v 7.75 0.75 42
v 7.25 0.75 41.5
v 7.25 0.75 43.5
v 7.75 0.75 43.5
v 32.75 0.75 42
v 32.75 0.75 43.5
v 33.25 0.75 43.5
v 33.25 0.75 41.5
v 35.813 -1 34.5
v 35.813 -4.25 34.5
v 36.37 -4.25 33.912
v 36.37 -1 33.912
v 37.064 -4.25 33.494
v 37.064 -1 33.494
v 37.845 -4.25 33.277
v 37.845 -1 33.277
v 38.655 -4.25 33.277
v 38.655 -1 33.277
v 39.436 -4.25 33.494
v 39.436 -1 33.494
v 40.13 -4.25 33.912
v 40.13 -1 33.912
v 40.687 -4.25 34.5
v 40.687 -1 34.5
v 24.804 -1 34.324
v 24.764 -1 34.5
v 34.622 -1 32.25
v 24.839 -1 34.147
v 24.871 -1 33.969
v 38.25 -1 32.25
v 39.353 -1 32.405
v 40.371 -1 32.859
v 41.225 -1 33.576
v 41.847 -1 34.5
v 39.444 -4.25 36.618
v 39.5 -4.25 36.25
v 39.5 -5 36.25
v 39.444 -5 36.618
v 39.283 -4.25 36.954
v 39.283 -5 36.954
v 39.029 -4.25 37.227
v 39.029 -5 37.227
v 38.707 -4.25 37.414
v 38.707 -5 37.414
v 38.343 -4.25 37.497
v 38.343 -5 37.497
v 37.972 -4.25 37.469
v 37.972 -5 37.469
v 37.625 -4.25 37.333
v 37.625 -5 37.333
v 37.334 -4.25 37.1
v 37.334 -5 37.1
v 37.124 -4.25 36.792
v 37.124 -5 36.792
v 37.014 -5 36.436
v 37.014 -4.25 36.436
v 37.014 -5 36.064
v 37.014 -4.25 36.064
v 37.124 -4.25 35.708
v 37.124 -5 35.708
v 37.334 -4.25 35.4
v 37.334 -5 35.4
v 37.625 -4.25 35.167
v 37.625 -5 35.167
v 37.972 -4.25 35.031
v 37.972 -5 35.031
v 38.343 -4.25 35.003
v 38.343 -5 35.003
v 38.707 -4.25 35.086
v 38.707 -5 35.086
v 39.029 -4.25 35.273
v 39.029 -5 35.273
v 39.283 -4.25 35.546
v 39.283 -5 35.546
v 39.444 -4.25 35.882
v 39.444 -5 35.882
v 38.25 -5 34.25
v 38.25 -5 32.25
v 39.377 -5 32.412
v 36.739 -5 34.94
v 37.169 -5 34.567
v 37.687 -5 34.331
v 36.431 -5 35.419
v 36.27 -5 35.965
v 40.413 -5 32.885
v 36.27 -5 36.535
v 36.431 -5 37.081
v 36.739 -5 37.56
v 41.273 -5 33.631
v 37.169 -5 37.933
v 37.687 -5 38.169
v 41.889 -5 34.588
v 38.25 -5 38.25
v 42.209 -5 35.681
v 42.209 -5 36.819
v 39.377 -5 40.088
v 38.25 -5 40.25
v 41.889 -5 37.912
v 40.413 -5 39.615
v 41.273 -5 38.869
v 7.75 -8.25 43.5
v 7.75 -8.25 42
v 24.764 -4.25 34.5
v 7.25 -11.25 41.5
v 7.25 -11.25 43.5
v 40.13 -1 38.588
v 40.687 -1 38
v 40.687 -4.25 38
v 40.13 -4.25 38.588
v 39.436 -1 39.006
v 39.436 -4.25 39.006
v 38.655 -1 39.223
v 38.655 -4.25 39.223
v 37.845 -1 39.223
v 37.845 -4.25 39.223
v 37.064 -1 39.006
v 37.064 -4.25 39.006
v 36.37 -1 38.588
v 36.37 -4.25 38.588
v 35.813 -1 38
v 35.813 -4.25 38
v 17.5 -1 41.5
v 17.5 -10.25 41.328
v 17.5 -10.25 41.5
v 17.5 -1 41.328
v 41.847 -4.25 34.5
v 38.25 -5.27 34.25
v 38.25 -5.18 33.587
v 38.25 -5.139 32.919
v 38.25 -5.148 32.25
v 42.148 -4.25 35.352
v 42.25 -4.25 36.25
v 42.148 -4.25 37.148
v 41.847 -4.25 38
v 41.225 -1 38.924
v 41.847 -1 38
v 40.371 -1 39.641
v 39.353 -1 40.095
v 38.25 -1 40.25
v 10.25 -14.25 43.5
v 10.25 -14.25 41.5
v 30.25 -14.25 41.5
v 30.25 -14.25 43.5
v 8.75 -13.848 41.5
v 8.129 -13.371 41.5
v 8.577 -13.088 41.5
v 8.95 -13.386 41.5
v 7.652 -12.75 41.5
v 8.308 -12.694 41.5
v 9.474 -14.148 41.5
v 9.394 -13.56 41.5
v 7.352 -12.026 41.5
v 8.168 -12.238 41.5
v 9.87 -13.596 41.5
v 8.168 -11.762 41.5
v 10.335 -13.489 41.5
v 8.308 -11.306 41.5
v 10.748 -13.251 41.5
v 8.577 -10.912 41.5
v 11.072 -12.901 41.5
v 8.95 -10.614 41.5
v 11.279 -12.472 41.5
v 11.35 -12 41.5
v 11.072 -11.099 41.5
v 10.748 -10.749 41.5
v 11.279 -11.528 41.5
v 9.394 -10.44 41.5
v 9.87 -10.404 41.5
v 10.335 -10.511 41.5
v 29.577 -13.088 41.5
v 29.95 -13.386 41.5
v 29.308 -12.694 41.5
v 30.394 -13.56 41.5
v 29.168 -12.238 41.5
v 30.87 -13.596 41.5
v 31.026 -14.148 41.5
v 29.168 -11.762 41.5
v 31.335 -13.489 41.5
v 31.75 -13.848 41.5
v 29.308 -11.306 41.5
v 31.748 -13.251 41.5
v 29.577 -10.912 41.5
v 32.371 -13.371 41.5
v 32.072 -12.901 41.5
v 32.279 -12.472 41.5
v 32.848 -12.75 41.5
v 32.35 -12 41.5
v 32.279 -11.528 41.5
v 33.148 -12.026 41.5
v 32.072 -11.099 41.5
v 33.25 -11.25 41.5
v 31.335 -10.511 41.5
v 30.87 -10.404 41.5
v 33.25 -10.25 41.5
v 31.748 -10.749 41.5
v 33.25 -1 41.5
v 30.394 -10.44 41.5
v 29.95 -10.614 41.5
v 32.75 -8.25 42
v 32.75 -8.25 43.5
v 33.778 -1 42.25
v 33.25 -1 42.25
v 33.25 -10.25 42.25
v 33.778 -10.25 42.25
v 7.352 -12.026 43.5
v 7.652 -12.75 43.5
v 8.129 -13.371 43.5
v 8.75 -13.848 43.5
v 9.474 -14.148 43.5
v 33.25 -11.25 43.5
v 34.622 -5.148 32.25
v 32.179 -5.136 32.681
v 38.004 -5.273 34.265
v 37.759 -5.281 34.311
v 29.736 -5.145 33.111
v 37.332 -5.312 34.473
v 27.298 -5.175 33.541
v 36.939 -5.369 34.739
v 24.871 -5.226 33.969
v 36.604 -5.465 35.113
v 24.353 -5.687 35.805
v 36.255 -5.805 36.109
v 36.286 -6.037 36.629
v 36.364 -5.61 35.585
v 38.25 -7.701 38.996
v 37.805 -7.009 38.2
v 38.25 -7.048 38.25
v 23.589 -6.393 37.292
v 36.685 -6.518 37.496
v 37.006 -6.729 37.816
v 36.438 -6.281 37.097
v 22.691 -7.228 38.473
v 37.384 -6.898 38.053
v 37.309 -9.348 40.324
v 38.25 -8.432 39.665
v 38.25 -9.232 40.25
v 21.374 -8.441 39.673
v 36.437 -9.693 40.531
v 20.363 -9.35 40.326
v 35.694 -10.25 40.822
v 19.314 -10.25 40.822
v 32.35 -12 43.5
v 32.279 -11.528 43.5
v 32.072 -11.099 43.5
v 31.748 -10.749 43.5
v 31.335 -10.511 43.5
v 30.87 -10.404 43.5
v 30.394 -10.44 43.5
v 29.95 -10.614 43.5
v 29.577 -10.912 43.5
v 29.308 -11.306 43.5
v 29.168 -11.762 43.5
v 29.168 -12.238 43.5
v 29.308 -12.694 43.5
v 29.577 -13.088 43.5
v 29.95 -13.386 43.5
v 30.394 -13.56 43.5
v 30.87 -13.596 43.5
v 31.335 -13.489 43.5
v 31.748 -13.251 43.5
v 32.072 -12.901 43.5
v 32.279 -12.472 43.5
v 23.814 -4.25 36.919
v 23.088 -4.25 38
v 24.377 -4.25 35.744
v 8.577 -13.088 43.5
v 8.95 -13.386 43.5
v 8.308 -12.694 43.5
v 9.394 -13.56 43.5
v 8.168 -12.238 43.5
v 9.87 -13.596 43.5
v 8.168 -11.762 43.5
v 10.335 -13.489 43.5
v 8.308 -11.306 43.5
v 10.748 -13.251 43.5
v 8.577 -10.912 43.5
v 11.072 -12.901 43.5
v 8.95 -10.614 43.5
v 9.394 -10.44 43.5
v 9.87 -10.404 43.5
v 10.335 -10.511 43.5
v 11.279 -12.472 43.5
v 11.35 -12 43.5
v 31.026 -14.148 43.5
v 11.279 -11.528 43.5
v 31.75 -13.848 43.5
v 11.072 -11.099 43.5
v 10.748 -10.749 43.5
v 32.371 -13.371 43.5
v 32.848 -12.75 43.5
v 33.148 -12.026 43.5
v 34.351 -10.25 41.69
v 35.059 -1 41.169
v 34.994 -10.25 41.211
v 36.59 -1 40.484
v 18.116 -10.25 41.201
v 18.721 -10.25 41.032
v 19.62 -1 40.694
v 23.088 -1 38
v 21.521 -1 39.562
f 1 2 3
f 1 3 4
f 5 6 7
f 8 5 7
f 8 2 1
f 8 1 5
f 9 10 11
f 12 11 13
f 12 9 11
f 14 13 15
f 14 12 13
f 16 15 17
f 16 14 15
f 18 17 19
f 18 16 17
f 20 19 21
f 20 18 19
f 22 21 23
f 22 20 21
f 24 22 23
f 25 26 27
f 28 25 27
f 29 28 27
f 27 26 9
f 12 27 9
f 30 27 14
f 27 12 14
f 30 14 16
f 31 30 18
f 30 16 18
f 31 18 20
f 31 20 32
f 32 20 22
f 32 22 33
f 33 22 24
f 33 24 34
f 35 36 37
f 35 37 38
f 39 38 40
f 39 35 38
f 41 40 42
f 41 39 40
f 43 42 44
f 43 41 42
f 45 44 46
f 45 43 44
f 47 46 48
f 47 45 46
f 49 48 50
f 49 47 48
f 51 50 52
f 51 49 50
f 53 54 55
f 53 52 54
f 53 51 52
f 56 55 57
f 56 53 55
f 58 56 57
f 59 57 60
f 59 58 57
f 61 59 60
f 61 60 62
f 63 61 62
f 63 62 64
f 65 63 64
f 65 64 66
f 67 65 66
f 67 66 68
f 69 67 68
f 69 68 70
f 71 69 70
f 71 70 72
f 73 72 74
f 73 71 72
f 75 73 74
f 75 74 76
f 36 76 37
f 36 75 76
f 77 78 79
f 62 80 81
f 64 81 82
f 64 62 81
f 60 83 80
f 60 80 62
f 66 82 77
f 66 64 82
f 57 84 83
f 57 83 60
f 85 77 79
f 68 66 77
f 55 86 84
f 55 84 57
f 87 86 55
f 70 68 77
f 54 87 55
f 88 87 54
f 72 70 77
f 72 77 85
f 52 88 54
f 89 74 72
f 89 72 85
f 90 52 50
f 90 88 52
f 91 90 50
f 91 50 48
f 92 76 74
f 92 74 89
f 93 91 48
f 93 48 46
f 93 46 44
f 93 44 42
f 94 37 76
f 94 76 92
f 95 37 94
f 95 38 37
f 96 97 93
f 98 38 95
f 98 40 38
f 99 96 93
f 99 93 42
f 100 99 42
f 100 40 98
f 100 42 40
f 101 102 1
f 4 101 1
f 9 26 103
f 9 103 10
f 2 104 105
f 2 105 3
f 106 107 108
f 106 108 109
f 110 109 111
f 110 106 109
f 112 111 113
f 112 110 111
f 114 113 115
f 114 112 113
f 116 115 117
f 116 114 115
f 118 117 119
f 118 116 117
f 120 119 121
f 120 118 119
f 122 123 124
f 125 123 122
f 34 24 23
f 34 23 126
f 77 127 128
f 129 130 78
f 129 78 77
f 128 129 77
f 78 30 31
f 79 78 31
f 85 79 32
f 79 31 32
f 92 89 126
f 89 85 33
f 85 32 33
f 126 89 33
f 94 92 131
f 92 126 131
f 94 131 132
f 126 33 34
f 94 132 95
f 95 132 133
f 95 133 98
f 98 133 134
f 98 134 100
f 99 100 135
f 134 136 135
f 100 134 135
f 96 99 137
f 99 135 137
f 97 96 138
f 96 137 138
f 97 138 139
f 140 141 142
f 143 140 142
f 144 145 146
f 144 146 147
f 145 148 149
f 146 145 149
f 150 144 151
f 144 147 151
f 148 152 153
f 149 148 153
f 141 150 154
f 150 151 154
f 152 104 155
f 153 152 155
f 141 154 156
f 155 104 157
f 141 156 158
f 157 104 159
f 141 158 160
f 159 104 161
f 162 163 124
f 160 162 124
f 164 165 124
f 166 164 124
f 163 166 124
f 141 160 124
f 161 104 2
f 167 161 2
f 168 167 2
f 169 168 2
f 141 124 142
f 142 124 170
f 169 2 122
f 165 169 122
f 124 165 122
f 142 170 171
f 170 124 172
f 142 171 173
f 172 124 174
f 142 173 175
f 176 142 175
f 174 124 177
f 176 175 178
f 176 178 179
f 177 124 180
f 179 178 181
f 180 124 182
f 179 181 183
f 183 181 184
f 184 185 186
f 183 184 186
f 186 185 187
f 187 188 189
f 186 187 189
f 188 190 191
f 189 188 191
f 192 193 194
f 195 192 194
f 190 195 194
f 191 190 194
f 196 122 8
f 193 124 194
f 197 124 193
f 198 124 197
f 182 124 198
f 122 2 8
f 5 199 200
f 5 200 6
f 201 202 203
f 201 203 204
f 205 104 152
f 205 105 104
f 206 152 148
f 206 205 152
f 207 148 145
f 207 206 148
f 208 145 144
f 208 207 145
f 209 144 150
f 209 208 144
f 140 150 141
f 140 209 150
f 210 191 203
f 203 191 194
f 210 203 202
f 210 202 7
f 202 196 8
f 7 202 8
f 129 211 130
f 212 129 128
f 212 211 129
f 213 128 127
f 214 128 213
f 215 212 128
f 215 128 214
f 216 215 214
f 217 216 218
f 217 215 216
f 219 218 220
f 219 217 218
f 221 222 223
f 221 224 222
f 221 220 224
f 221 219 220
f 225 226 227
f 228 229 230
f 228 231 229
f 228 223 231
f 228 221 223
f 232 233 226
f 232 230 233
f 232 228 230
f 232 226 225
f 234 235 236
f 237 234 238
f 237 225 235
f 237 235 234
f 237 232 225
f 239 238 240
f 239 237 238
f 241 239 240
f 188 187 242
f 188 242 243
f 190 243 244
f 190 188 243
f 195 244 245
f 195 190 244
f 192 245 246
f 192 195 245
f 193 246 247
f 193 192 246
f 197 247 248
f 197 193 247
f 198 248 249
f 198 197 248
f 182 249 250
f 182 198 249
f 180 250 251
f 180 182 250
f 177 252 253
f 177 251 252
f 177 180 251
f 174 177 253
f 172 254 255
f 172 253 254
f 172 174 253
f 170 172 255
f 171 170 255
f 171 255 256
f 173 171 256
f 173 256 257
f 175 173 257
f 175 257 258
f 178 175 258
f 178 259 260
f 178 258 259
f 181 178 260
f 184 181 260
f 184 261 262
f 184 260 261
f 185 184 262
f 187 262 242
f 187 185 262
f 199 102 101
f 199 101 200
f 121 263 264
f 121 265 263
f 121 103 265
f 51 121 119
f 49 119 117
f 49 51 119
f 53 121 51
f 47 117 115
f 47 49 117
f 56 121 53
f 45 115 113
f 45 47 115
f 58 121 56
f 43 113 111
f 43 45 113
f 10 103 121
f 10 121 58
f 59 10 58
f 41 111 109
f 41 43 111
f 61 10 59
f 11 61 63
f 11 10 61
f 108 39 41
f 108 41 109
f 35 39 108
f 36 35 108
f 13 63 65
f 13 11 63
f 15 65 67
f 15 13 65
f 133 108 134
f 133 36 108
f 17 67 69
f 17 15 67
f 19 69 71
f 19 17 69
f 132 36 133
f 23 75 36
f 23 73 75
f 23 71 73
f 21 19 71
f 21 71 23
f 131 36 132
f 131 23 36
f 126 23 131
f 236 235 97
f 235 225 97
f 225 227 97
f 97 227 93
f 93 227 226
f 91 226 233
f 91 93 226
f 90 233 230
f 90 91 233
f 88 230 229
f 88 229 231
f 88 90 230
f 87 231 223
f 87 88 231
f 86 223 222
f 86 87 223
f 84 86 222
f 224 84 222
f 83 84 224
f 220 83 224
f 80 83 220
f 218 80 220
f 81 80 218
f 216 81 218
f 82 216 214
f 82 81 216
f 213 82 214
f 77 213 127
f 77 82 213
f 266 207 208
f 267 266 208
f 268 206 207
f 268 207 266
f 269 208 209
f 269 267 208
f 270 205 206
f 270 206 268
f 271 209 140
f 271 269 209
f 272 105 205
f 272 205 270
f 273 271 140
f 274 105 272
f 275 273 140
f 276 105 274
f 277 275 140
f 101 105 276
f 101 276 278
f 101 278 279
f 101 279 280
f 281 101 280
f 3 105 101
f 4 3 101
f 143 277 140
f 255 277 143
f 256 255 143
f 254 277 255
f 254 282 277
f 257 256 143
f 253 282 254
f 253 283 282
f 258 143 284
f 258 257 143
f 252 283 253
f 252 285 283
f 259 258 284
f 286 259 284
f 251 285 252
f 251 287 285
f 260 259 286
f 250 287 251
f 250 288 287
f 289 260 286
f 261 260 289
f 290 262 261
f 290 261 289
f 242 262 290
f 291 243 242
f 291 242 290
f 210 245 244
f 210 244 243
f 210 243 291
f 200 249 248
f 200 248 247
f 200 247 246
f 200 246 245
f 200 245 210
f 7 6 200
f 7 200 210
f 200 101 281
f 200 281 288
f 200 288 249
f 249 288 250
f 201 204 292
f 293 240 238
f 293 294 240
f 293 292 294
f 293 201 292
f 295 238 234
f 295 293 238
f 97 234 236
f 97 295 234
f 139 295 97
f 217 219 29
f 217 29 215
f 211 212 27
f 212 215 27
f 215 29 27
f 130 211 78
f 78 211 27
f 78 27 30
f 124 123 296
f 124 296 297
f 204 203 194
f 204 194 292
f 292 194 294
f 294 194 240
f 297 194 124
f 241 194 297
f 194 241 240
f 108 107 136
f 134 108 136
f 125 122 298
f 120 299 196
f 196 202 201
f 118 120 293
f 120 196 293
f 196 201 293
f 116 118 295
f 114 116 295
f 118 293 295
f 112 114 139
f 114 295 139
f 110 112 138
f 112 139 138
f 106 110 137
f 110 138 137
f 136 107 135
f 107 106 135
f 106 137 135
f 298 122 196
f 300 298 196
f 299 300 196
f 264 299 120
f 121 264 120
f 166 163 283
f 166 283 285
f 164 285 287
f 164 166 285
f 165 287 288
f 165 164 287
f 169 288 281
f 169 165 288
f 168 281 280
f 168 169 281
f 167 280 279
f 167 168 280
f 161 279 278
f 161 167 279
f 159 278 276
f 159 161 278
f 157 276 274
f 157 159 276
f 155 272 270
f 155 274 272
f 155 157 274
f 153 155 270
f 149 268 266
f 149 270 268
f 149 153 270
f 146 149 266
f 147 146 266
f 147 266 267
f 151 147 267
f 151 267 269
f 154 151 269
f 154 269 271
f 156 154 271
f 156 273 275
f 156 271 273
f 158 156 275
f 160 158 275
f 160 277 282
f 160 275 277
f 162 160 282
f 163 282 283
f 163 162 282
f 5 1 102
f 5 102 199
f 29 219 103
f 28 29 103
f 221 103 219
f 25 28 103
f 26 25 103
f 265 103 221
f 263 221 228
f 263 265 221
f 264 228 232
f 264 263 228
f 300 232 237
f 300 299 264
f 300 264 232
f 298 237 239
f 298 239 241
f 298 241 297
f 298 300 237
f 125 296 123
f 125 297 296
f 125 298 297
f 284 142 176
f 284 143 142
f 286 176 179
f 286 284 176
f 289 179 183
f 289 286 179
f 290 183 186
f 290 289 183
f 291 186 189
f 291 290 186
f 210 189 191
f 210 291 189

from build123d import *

# Parameters (mm, degrees)
BOX239_W               = 25
BOX239_H               = 10
BOX239_DEPTH           = 10
BOX239_PLACEMENT_ANGLE = 10
BOX236_W               = 25
BOX236_H               = 10
BOX236_DEPTH           = 10
CYLINDER312_R          = 9
CYLINDER312_DEPTH      = 17
CYLINDER311_R          = 9
CYLINDER311_DEPTH      = 24
CYLINDER315_R          = 3
CYLINDER315_DEPTH      = 10
BOX234_W               = 21
BOX234_H               = 7
BOX234_DEPTH           = 3.5
CYLINDER317_R          = 1.25
CYLINDER317_DEPTH      = 10
CYLINDER318_R          = 6
CYLINDER318_DEPTH      = 10
CYLINDER313_R          = 2
CYLINDER313_DEPTH      = 10
BOX230_W               = 20.75
BOX230_H               = 9.25
BOX230_DEPTH           = 10
CYLINDER316_R          = 4
CYLINDER316_DEPTH      = 4
BOX233_W               = 12
BOX233_H               = 4
BOX233_DEPTH           = 8
CYLINDER310_R          = 1.6
CYLINDER310_DEPTH      = 10
CYLINDER309_R          = 1.6
CYLINDER309_DEPTH      = 10
BOX231_W               = 26
BOX231_H               = 15
BOX231_DEPTH           = 2
FILLET122_R            = 3


with BuildPart() as w_rfel226:
    # Box239 → Box239 (new body)
    with BuildSketch(Plane.XY):
        with Locations((12.5, 5)):
            Rectangle(BOX239_W, BOX239_H)
    extrude(amount=BOX239_DEPTH)


with BuildPart() as w_rfel226_1:
    # Box239 placement: moved
    add(w_rfel226.part.moved(Location((10.031417, -8.25, 26.431635))).rotate(Axis((10.031417, -8.25, 26.431635), (0, 1, 0)), BOX239_PLACEMENT_ANGLE))


with BuildPart() as w_rfel223:
    # Box236 → Box236 (new body)
    with BuildSketch(Plane(origin=(7.75, -8.25, 42), x_dir=(1, 0, 0), z_dir=(0, 0, 1))):
        with Locations((12.5, 5)):
            Rectangle(BOX236_W, BOX236_H)
    extrude(amount=BOX236_DEPTH)


with BuildPart() as zylinder314:
    # Cylinder312 → Cylinder312 (new body)
    with BuildSketch(Plane(origin=(16, 3.363861, 32.453751), x_dir=(-1, 0, 0), z_dir=(0, -1, 0))):
        Circle(CYLINDER312_R)
    extrude(amount=CYLINDER312_DEPTH)


with BuildPart() as fusion210:
    # Cylinder311 → Cylinder311 (new body)
    with BuildSketch(Plane(origin=(16.5, -14.136139, 32.703751), x_dir=(0, -1, 0), z_dir=(1, 0, 0))):
        Circle(CYLINDER311_R)
    extrude(amount=CYLINDER311_DEPTH)

    # Fusion210: union Zylinder314
    add(zylinder314.part)


with BuildPart() as zylinder317:
    # Cylinder315 → Cylinder315 (new body)
    with BuildSketch(Plane(origin=(38.25, 5.75, 36.25), x_dir=(1, 0, 0), z_dir=(0, -1, 0))):
        Circle(CYLINDER315_R)
    extrude(amount=CYLINDER315_DEPTH)


with BuildPart() as w_rfel221:
    # Box234 → Box234 (new body)
    with BuildSketch(Plane(origin=(22.5, -4.25, 34.5), x_dir=(1, 0, 0), z_dir=(0, 0, 1))):
        with Locations((10.5, 3.5)):
            Rectangle(BOX234_W, BOX234_H)
    extrude(amount=BOX234_DEPTH)


with BuildPart() as zylinder319:
    # Cylinder317 → Cylinder317 (new body)
    with BuildSketch(Plane(origin=(38.25, 3.25, 36.25), x_dir=(1, 0, 0), z_dir=(0, -1, 0))):
        Circle(CYLINDER317_R)
    extrude(amount=CYLINDER317_DEPTH)


with BuildPart() as zylinder320:
    # Cylinder318 → Cylinder318 (new body)
    with BuildSketch(Plane(origin=(38.25, -0.5, 46.25), x_dir=(1, 0, 0), z_dir=(0, -1, 0))):
        Circle(CYLINDER318_R)
    extrude(amount=CYLINDER318_DEPTH)


with BuildPart() as fusion212:
    # Cylinder313 → Cylinder313 (new body)
    with BuildSketch(Plane(origin=(38.25, -5, 36.25), x_dir=(1, 0, 0), z_dir=(0, -1, 0))):
        Circle(CYLINDER313_R)
    extrude(amount=CYLINDER313_DEPTH)

    # Fusion212: union Zylinder317, Würfel221, Zylinder319, Zylinder320
    add(zylinder317.part)
    add(w_rfel221.part)
    add(zylinder319.part)
    add(zylinder320.part)


with BuildPart() as w_rfel217:
    # Box230 → Box230 (new body)
    with BuildSketch(Plane(origin=(17.5, -10.25, 32.25), x_dir=(1, 0, 0), z_dir=(0, 0, 1))):
        with Locations((10.375, 4.625)):
            Rectangle(BOX230_W, BOX230_H)
    extrude(amount=BOX230_DEPTH)


with BuildPart() as zylinder318:
    # Cylinder316 → Cylinder316 (new body)
    with BuildSketch(Plane(origin=(38.25, -1, 36.25), x_dir=(1, 0, 0), z_dir=(0, -1, 0))):
        Circle(CYLINDER316_R)
    extrude(amount=CYLINDER316_DEPTH)


with BuildPart() as cut146:
    # Box233 → Box233 (new body)
    with BuildSketch(Plane(origin=(26.25, -5, 32.25), x_dir=(1, 0, 0), z_dir=(0, 0, 1))):
        with Locations((6, 2)):
            Rectangle(BOX233_W, BOX233_H)
    extrude(amount=BOX233_DEPTH)

    # Fusion211: union Würfel217, Zylinder318
    add(w_rfel217.part)
    add(zylinder318.part)

    # Cut145: cut Fusion212
    add(fusion212.part, mode=Mode.SUBTRACT)

    # Cut146: cut Fusion210
    add(fusion210.part, mode=Mode.SUBTRACT)


with BuildPart() as zylinder312:
    # Cylinder310 → Cylinder310 (new body)
    with BuildSketch(Plane(origin=(35, -13.75, 33.25), x_dir=(1, 0, 0), z_dir=(0, 0, 1))):
        Circle(CYLINDER310_R)
    extrude(amount=CYLINDER310_DEPTH)


with BuildPart() as fusion209:
    # Cylinder309 → Cylinder309 (new body)
    with BuildSketch(Plane(origin=(14, -13.75, 33.25), x_dir=(1, 0, 0), z_dir=(0, 0, 1))):
        Circle(CYLINDER309_R)
    extrude(amount=CYLINDER309_DEPTH)

    # Fusion209: union Zylinder312
    add(zylinder312.part)


with BuildPart() as fusion209_1:
    # Fusion209 placement: moved
    add(fusion209.part.moved(Location((0.5, 0, 5))))


with BuildPart() as cut149:
    # Box231 → Box231 (new body)
    with BuildSketch(Plane(origin=(12, -16, 41.5), x_dir=(1, 0, 0), z_dir=(0, 0, 1))):
        with Locations((13, 7.5)):
            Rectangle(BOX231_W, BOX231_H)
    extrude(amount=BOX231_DEPTH)

    # Cut144: cut Fusion209
    add(fusion209_1.part, mode=Mode.SUBTRACT)


with BuildPart() as cut149_1:
    # Cut144 placement: moved
    add(cut149.part.moved(Location((0, 1.75, 0))))

    # Fillet122
    fillet122_edges = [cut149_1.edges().sort_by_distance(p)[0] for p in [
        (12, -14.25, 42.5),
        (38, -14.25, 42.5),
    ]]
    fillet(fillet122_edges, radius=FILLET122_R)


with BuildPart() as cut149_2:
    # Fillet122 placement: moved
    add(cut149_1.part.moved(Location((-4.75, 0, 0))))

    # Fusion213: union Cut146
    add(cut146.part)

    # Cut147: cut Würfel223
    add(w_rfel223.part, mode=Mode.SUBTRACT)

    # Cut149: cut Würfel226
    add(w_rfel226_1.part, mode=Mode.SUBTRACT)


solid = cut149_2.part
